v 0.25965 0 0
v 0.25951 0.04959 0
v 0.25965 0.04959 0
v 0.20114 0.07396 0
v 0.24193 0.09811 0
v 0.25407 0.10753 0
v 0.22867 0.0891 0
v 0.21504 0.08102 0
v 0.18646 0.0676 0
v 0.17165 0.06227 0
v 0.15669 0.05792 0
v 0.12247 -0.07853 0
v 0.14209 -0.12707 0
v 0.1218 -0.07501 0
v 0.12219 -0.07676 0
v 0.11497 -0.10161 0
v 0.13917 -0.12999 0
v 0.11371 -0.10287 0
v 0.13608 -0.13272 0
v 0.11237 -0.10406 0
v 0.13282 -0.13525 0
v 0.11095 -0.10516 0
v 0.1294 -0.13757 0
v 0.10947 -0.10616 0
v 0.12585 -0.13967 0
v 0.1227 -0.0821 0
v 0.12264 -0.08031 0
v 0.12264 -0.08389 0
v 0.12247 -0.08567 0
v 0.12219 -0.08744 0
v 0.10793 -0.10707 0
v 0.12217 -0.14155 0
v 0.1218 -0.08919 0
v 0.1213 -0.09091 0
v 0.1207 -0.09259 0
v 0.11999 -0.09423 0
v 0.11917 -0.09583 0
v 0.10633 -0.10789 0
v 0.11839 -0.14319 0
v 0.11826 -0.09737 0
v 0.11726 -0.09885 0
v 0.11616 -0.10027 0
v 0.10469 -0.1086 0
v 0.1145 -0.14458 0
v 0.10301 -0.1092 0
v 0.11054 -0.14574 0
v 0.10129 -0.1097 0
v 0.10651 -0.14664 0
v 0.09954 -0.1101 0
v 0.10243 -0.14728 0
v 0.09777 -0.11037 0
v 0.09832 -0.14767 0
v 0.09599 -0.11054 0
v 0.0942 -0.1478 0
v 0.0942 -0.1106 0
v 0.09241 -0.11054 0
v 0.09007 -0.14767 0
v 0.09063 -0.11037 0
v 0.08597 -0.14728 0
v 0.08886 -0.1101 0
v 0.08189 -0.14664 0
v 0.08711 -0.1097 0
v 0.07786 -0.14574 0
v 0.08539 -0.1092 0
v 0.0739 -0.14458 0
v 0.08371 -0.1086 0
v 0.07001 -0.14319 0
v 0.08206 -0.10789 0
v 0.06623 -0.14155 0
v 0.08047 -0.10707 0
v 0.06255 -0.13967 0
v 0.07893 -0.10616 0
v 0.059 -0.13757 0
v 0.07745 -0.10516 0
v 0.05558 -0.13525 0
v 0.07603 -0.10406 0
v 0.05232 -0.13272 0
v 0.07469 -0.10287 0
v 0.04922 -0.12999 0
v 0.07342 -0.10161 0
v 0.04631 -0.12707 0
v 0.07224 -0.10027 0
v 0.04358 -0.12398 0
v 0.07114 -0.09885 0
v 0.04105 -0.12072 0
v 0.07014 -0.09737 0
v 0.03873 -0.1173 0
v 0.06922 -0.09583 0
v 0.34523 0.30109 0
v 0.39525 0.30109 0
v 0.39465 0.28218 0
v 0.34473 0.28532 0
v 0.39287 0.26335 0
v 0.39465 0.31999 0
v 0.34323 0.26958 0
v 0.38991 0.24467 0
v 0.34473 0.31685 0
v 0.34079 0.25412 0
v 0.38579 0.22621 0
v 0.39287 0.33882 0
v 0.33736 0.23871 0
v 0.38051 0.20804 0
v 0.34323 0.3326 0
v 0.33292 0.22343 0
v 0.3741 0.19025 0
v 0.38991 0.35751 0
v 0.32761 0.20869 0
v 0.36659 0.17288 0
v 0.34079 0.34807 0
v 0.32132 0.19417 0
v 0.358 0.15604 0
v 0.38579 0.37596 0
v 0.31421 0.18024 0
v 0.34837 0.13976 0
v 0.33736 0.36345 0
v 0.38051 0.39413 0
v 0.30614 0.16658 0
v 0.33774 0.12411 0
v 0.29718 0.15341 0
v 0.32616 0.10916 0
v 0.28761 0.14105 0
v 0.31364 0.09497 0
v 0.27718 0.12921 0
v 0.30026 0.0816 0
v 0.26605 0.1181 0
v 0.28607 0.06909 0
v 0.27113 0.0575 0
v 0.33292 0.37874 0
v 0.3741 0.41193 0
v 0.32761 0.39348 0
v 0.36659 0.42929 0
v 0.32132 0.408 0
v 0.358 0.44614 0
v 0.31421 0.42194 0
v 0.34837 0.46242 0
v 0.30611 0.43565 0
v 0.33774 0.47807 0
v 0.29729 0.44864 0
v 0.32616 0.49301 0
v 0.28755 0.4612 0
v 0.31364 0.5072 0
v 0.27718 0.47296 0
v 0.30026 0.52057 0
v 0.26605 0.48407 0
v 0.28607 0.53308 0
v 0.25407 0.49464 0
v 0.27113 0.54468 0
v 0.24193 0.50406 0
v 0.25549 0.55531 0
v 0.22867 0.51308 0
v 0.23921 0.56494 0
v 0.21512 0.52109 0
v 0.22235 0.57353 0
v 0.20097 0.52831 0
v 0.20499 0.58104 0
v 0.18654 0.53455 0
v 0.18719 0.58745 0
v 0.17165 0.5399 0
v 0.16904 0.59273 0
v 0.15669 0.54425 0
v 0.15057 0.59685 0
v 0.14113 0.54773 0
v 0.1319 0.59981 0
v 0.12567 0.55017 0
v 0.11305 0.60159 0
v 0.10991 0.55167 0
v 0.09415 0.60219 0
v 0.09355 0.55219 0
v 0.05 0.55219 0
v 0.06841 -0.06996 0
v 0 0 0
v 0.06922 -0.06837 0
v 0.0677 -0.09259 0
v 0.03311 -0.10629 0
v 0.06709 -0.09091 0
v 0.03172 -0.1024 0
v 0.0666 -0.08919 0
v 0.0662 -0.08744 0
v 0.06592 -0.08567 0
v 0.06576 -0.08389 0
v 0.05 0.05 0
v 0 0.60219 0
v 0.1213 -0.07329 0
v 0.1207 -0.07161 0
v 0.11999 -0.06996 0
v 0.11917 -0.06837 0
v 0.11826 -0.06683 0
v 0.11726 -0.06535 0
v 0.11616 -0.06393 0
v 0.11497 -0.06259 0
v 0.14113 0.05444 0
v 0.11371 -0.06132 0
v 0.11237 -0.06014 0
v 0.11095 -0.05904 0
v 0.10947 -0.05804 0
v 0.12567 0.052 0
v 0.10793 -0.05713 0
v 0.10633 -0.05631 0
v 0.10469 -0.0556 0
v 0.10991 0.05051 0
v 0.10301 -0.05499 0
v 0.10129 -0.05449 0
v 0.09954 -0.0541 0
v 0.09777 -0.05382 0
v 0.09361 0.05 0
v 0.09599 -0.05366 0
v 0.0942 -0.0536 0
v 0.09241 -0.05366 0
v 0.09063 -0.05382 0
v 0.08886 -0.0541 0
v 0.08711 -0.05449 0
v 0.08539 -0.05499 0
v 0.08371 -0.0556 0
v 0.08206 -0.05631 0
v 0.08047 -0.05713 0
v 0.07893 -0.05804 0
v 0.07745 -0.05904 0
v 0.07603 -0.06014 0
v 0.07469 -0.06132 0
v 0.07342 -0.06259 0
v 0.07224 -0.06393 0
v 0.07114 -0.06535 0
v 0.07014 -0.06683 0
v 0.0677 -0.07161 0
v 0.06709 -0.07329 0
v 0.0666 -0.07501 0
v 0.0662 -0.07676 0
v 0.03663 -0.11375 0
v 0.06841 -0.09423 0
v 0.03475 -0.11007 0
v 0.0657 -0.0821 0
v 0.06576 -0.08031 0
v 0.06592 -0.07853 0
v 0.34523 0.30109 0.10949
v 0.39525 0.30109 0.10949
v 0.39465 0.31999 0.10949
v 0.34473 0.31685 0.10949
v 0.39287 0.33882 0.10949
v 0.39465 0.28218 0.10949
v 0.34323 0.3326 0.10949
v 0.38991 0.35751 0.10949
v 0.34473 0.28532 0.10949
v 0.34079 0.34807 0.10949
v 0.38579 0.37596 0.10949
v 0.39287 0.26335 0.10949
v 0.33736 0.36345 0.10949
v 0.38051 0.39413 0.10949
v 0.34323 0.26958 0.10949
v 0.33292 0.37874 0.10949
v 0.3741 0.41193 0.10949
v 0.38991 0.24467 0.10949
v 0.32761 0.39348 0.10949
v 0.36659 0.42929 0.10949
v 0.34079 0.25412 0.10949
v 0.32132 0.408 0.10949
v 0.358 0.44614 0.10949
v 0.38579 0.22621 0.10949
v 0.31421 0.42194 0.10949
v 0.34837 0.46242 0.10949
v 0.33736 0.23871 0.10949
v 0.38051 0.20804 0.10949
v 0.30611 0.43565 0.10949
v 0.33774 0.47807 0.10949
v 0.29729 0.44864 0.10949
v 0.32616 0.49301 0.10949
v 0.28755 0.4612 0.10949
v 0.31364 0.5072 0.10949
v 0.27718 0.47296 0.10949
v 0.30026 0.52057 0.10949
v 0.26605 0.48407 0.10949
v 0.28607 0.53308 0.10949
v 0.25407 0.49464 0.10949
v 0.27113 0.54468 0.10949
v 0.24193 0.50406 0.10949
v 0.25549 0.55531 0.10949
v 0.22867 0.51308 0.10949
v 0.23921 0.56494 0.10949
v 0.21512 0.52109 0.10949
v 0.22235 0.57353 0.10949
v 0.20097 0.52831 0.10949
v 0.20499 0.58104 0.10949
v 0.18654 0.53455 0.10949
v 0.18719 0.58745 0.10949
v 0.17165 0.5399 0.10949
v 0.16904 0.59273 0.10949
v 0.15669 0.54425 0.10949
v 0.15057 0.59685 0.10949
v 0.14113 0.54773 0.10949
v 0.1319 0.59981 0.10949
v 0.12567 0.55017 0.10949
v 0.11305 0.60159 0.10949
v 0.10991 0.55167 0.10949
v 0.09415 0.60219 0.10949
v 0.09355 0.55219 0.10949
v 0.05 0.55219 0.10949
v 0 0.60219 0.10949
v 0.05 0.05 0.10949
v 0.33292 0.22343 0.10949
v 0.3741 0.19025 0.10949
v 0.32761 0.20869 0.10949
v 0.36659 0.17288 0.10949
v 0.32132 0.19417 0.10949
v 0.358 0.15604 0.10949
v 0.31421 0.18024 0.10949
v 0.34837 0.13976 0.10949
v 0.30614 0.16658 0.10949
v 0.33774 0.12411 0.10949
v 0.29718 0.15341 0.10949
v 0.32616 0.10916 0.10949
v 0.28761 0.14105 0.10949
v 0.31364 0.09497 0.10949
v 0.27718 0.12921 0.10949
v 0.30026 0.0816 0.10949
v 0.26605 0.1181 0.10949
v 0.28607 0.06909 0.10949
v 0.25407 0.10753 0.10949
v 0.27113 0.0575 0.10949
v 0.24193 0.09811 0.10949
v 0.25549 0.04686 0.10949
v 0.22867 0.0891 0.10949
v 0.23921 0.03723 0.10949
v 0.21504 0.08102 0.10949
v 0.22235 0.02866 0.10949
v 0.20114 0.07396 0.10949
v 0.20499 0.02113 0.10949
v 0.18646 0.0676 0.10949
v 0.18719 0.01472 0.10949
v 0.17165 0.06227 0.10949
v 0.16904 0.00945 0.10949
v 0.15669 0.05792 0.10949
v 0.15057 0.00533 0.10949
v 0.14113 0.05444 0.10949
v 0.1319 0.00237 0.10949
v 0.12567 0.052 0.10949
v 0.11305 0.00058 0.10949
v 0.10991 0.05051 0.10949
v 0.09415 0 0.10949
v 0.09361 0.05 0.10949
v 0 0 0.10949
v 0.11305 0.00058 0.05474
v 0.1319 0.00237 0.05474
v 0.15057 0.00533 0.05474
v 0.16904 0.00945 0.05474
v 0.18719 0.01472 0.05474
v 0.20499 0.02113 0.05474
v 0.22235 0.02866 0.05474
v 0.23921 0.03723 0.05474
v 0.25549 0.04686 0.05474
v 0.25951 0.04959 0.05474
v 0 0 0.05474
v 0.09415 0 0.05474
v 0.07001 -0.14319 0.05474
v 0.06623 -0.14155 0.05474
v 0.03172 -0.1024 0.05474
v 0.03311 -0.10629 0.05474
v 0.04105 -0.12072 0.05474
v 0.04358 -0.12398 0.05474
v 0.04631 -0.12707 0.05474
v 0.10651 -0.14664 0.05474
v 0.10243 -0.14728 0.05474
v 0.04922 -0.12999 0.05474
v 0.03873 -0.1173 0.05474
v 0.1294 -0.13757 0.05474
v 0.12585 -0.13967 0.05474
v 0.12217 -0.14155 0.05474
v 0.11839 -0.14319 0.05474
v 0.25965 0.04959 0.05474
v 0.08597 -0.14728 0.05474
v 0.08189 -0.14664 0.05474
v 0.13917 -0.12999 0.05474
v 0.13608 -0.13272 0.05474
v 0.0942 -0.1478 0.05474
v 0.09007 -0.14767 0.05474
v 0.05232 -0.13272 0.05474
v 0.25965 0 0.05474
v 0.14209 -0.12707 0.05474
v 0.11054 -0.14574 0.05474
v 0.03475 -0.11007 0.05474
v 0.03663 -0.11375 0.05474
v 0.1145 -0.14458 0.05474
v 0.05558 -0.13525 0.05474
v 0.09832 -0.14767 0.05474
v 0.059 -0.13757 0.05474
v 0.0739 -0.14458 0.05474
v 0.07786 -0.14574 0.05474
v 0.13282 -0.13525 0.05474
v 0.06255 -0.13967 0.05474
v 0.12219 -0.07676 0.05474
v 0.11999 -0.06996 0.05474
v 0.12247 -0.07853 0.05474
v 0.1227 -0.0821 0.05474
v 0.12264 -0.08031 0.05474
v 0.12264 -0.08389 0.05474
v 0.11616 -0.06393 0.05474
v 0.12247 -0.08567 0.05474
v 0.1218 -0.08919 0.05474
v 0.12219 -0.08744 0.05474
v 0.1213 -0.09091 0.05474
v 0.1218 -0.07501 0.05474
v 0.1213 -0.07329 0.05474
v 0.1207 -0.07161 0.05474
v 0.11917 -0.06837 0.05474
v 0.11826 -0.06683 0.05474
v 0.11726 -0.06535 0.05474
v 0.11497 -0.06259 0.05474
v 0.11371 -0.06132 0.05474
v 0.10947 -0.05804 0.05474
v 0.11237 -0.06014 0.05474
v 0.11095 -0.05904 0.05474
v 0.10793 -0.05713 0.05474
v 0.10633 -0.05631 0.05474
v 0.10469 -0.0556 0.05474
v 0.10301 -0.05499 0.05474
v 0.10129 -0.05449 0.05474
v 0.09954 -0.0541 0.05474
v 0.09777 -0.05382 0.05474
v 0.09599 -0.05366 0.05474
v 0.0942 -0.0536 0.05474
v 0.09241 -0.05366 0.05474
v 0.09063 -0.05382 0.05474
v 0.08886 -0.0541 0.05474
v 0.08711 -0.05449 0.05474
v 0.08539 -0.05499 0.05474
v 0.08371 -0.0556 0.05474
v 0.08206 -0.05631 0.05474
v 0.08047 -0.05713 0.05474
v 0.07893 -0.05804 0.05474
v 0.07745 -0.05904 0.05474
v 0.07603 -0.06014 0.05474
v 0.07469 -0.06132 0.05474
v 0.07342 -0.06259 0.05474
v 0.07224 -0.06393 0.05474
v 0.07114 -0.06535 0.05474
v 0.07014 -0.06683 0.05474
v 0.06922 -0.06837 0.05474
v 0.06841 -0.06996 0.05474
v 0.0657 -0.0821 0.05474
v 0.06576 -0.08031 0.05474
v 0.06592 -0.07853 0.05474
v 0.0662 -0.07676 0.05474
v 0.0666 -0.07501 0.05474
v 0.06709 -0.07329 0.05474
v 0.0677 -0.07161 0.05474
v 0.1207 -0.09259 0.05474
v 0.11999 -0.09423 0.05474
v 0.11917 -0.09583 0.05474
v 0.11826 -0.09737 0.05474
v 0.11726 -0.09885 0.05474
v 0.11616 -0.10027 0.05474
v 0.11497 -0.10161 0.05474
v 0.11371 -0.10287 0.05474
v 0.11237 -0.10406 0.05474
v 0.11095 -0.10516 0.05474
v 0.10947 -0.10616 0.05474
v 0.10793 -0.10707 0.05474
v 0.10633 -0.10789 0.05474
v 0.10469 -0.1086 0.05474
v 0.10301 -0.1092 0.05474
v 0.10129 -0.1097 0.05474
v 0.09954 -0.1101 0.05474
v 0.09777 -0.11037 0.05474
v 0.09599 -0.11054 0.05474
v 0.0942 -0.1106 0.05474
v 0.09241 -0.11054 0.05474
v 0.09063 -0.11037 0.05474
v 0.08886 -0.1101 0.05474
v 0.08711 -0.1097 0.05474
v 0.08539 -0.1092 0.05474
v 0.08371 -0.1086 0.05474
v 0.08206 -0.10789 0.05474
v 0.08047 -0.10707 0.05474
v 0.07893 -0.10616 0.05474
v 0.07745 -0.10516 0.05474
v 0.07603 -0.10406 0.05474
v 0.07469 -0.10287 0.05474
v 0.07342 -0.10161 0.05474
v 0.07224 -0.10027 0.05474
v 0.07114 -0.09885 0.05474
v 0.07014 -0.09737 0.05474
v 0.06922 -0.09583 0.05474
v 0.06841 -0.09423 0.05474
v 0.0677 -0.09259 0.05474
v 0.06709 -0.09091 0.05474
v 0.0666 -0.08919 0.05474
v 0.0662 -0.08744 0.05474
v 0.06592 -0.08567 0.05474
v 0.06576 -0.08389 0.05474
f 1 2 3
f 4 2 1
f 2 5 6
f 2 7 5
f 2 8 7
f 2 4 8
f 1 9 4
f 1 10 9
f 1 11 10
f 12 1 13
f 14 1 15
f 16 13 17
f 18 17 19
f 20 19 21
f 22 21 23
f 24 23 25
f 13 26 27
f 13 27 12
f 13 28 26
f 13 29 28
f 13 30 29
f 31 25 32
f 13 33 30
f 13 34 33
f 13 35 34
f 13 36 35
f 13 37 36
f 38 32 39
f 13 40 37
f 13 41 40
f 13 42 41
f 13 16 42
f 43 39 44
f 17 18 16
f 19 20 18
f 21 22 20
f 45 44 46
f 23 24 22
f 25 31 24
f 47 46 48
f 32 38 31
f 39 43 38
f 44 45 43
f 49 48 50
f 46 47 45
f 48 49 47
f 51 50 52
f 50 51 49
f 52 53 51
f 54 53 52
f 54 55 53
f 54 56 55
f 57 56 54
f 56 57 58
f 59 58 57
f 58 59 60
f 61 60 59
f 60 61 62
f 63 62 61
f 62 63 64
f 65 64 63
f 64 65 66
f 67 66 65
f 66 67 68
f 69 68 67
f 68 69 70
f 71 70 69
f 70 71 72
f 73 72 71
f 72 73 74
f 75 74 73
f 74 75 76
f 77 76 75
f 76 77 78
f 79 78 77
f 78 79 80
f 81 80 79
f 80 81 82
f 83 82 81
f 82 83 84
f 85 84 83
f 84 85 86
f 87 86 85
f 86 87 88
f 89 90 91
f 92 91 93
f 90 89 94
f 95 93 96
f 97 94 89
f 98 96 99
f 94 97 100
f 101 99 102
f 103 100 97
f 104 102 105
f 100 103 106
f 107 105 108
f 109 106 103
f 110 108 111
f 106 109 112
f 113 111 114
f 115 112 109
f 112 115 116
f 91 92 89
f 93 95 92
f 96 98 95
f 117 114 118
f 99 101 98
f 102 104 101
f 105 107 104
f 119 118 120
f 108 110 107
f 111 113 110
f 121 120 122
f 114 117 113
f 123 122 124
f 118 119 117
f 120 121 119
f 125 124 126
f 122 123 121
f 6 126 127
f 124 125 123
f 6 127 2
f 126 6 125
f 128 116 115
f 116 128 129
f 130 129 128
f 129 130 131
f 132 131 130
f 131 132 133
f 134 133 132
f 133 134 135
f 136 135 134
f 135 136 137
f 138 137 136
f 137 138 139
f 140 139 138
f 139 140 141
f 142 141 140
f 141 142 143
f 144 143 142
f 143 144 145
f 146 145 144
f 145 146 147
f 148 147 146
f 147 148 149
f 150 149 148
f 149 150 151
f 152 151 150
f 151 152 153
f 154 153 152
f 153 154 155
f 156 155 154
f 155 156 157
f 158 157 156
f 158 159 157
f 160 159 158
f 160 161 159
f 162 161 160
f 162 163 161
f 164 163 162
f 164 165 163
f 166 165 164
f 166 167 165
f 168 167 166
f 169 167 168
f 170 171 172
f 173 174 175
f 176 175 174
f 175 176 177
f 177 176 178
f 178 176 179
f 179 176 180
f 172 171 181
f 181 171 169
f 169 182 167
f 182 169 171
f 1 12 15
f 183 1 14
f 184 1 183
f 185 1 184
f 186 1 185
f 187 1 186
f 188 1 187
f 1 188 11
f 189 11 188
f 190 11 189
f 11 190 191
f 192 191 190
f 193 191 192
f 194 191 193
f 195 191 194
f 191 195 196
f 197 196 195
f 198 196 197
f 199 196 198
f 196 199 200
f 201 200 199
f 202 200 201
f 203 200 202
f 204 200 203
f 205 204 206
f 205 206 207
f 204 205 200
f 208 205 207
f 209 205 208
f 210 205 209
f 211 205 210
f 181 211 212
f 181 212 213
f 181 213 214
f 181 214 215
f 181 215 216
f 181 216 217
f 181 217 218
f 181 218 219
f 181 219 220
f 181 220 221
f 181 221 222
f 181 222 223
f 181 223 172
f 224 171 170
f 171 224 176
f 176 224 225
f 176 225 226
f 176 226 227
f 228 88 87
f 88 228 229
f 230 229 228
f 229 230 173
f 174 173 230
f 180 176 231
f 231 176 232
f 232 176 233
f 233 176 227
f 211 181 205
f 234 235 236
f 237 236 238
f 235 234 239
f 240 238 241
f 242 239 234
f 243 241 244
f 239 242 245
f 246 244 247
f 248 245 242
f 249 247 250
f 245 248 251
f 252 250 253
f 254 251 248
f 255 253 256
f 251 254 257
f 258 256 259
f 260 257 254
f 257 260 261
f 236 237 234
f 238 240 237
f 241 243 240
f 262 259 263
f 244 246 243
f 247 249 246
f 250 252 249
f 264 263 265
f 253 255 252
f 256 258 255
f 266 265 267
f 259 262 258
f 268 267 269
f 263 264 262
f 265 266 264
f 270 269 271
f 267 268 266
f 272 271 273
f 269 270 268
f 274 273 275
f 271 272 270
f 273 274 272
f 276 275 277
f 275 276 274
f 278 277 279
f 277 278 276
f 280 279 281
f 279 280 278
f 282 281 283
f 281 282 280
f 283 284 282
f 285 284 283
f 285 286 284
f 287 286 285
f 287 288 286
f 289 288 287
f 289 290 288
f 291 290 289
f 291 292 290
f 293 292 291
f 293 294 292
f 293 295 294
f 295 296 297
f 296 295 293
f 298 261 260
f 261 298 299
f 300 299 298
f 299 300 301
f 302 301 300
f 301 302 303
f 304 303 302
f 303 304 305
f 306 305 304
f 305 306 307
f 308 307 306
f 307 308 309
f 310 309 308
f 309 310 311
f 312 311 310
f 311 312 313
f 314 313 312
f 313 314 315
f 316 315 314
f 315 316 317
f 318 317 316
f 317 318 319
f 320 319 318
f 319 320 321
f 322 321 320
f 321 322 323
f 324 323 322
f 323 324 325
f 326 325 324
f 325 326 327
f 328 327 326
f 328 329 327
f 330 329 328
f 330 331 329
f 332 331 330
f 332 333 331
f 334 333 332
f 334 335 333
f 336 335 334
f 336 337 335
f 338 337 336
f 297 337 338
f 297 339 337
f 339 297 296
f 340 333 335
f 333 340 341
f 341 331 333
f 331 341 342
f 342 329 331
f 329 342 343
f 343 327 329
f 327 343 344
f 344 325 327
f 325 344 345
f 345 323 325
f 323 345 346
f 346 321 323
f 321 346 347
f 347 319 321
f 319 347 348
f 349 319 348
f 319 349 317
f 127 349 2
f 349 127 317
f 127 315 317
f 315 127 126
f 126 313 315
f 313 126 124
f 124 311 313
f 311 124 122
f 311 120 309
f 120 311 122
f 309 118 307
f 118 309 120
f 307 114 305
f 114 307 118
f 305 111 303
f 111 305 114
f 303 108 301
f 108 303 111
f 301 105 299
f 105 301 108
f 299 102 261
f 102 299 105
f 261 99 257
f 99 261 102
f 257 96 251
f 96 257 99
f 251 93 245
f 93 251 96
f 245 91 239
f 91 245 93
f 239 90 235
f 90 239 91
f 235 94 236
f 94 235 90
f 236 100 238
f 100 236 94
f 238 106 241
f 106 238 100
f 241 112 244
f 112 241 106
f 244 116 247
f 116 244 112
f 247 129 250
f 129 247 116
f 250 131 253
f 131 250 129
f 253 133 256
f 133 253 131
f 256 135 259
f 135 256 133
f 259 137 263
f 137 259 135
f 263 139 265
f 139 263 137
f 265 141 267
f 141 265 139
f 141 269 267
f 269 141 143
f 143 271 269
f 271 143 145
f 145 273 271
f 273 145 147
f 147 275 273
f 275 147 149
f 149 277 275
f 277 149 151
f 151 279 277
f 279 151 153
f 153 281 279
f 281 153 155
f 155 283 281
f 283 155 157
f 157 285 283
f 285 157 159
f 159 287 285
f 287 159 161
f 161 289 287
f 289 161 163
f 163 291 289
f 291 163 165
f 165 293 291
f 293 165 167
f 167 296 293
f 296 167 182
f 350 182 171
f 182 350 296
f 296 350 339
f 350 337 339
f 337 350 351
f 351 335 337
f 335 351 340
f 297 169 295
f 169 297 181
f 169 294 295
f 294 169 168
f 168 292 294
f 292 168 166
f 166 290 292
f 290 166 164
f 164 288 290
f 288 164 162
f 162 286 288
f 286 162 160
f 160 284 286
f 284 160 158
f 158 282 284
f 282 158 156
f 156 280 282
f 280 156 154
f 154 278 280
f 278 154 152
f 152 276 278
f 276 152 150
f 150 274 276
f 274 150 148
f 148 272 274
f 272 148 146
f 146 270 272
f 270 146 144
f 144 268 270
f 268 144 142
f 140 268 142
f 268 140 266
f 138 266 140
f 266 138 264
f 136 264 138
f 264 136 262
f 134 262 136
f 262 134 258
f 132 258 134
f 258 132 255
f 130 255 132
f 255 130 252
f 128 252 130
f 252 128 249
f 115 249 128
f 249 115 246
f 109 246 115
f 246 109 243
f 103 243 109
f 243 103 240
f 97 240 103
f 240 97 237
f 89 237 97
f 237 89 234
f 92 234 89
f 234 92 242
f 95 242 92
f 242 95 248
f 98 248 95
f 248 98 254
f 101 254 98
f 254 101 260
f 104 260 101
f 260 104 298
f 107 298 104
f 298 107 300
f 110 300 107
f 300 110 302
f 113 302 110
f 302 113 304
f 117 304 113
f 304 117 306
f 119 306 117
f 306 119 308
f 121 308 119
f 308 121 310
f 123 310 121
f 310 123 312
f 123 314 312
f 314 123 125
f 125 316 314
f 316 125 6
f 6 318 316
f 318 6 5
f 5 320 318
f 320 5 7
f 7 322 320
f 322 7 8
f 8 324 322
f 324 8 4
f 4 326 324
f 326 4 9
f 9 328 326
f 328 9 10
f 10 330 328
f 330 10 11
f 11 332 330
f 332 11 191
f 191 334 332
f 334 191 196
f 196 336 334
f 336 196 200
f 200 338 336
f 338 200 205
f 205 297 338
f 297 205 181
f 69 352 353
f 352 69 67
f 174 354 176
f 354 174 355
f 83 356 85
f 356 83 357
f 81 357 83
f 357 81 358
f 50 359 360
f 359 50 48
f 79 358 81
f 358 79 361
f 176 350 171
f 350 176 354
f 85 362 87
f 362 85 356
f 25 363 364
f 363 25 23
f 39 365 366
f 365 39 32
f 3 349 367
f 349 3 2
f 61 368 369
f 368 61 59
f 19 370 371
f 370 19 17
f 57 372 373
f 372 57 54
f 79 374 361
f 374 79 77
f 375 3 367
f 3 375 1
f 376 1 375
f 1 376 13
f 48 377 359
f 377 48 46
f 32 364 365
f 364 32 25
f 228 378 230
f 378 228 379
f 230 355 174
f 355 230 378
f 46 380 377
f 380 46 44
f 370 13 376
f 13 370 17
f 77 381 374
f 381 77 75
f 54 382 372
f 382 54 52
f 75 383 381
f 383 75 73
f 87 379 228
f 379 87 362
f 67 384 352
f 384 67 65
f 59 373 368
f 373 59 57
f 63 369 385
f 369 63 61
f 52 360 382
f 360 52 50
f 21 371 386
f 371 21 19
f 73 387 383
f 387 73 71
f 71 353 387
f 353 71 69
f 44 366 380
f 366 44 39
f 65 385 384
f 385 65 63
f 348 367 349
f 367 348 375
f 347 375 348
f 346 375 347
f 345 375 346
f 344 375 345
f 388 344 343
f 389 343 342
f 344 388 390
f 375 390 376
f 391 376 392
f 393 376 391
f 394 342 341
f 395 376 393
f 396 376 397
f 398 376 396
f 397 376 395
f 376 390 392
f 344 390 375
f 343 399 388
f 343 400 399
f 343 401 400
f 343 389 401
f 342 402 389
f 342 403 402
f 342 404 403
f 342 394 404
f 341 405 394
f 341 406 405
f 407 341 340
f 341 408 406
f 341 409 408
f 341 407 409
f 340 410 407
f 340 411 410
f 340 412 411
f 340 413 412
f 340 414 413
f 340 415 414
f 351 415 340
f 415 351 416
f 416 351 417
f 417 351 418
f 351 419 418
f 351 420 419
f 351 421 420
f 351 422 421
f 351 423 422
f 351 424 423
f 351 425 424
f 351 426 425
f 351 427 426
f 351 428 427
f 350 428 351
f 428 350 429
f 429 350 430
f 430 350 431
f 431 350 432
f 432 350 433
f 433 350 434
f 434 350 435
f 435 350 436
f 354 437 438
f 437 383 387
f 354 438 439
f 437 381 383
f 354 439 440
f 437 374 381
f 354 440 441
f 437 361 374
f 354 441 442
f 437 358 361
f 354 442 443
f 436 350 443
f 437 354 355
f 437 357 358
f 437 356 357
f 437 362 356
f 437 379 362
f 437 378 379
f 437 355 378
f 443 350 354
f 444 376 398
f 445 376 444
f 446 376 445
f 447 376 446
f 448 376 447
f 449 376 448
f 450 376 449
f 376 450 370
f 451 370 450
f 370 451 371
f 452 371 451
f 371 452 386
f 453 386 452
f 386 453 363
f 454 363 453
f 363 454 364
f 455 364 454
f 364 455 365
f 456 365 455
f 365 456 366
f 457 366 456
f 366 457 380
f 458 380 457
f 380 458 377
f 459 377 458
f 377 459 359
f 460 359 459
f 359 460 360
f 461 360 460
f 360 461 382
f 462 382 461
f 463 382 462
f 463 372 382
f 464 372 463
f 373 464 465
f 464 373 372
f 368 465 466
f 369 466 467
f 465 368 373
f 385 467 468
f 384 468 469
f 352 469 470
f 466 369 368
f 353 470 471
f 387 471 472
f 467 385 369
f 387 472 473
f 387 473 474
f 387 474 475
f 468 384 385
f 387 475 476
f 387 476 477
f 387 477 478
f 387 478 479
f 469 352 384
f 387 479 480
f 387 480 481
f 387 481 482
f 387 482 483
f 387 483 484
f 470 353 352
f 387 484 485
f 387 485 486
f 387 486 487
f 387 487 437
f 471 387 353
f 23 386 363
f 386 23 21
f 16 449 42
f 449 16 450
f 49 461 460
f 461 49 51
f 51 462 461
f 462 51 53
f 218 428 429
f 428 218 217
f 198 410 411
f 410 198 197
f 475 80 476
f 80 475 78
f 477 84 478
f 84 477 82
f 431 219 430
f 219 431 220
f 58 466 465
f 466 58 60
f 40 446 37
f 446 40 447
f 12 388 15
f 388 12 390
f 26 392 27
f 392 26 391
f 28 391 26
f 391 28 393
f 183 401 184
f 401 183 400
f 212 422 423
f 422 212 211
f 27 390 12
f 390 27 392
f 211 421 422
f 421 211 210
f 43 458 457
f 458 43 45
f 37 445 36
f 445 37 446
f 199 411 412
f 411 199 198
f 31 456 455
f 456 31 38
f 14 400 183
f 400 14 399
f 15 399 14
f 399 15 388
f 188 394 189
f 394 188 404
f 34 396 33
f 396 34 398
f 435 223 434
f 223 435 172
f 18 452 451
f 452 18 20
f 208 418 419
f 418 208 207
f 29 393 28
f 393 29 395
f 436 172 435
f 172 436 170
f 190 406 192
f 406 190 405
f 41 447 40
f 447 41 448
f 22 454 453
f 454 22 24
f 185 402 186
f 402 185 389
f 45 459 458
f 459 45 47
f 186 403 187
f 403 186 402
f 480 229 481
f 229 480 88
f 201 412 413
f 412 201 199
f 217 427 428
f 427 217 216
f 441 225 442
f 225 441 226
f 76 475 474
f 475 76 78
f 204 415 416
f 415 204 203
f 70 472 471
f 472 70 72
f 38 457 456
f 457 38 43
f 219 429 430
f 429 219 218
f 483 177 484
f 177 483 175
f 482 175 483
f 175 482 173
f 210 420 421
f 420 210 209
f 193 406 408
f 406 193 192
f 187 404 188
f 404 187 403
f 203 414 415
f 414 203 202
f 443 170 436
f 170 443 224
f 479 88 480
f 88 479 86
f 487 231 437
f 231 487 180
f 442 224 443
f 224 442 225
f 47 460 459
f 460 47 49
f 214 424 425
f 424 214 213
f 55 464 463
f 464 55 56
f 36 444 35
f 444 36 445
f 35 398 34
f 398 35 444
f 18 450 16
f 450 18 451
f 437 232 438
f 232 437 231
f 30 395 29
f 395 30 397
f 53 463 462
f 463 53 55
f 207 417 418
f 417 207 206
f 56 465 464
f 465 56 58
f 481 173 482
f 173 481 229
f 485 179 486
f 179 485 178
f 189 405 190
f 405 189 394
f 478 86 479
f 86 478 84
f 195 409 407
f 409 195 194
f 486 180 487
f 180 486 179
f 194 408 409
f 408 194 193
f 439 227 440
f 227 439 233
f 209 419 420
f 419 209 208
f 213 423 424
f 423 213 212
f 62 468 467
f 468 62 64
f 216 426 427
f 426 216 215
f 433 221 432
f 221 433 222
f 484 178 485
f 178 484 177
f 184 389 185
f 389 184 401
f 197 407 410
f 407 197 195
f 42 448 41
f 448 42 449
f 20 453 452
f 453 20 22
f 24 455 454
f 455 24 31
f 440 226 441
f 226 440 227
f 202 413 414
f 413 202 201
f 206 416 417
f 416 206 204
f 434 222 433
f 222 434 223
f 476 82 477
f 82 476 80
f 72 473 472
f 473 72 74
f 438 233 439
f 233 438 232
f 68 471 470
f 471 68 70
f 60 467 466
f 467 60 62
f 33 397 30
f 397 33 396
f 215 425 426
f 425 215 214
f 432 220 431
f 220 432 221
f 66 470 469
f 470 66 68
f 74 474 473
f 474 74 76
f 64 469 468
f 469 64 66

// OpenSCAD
// === Parameters ===

// Main D-shaped frame dimensions
main_length = 0.395255;    // X extent of footprint
main_width  = 0.60219;     // Y extent of footprint
main_height = 0.109489;    // Z extrusion depth

// Frame wall thickness (parametric)
wall_thickness = 0.05;

// D-shape derived geometry
arc_radius      = main_width / 2;              // semicircle radius
straight_section = main_length - arc_radius;   // straight side length

// Protrusion circular profile
prot_height   = 0.054745;  // shallower Z height
prot_center_x = 0.0942;    // circular axis left-offset
prot_center_y = -0.0821;   // circular axis front-offset (negative = outside frame)
prot_r_outer  = 0.0657;    // outer radius
prot_r_inner  = 0.0285;    // concentric hole radius

// Protrusion attachment rectangle (from edge offsets)
prot_rect_len = main_length - 0.1356;  // ~0.2597, right-edge inset
prot_rect_wid = main_width  - 0.5526;  // ~0.0496, back-edge inset

// Smoothness
$fn = 100;

// === 2D Modules ===

// D-shape: flat left (rear) wall, semicircular right (front) arc
module d_shape_2d(l, w) {
    r = w / 2;
    s = l - r;  // straight portion length
    union() {
        // Rectangular left portion (rear + sides)
        square([s, w]);
        // Right semicircle (curved arc wall)
        intersection() {
            translate([s, r])
                circle(r = r);
            translate([s, 0])
                square([r, w]);
        }
    }
}

// D-frame: outer D minus inset inner D (through-opening)
module d_frame_2d(l, w, wt) {
    difference() {
        d_shape_2d(l, w);
        offset(delta = -wt)
            d_shape_2d(l, w);
    }
}

// Protrusion tab: convex hull of outer circle and attachment rectangle
module protrusion_tab_2d(cx, cy, r, rl, rw) {
    hull() {
        // Circular profile outside the frame
        translate([cx, cy])
            circle(r = r);
        // Rectangle overlapping frame wall for solid attachment
        square([rl, rw]);
    }
}

// === Main Assembly ===

difference() {
    union() {
        // Primary body: D-shaped frame at full depth
        linear_extrude(height = main_height)
            d_frame_2d(main_length, main_width, wall_thickness);

        // Shallower protrusion tab attached to frame underside region
        linear_extrude(height = prot_height)
            protrusion_tab_2d(
                prot_center_x, prot_center_y,
                prot_r_outer,
                prot_rect_len, prot_rect_wid
            );
    }

    // Concentric circular hole through the shallow protrusion band
    translate([prot_center_x, prot_center_y, -0.001])
        cylinder(h = prot_height + 0.002, r = prot_r_inner);
}
